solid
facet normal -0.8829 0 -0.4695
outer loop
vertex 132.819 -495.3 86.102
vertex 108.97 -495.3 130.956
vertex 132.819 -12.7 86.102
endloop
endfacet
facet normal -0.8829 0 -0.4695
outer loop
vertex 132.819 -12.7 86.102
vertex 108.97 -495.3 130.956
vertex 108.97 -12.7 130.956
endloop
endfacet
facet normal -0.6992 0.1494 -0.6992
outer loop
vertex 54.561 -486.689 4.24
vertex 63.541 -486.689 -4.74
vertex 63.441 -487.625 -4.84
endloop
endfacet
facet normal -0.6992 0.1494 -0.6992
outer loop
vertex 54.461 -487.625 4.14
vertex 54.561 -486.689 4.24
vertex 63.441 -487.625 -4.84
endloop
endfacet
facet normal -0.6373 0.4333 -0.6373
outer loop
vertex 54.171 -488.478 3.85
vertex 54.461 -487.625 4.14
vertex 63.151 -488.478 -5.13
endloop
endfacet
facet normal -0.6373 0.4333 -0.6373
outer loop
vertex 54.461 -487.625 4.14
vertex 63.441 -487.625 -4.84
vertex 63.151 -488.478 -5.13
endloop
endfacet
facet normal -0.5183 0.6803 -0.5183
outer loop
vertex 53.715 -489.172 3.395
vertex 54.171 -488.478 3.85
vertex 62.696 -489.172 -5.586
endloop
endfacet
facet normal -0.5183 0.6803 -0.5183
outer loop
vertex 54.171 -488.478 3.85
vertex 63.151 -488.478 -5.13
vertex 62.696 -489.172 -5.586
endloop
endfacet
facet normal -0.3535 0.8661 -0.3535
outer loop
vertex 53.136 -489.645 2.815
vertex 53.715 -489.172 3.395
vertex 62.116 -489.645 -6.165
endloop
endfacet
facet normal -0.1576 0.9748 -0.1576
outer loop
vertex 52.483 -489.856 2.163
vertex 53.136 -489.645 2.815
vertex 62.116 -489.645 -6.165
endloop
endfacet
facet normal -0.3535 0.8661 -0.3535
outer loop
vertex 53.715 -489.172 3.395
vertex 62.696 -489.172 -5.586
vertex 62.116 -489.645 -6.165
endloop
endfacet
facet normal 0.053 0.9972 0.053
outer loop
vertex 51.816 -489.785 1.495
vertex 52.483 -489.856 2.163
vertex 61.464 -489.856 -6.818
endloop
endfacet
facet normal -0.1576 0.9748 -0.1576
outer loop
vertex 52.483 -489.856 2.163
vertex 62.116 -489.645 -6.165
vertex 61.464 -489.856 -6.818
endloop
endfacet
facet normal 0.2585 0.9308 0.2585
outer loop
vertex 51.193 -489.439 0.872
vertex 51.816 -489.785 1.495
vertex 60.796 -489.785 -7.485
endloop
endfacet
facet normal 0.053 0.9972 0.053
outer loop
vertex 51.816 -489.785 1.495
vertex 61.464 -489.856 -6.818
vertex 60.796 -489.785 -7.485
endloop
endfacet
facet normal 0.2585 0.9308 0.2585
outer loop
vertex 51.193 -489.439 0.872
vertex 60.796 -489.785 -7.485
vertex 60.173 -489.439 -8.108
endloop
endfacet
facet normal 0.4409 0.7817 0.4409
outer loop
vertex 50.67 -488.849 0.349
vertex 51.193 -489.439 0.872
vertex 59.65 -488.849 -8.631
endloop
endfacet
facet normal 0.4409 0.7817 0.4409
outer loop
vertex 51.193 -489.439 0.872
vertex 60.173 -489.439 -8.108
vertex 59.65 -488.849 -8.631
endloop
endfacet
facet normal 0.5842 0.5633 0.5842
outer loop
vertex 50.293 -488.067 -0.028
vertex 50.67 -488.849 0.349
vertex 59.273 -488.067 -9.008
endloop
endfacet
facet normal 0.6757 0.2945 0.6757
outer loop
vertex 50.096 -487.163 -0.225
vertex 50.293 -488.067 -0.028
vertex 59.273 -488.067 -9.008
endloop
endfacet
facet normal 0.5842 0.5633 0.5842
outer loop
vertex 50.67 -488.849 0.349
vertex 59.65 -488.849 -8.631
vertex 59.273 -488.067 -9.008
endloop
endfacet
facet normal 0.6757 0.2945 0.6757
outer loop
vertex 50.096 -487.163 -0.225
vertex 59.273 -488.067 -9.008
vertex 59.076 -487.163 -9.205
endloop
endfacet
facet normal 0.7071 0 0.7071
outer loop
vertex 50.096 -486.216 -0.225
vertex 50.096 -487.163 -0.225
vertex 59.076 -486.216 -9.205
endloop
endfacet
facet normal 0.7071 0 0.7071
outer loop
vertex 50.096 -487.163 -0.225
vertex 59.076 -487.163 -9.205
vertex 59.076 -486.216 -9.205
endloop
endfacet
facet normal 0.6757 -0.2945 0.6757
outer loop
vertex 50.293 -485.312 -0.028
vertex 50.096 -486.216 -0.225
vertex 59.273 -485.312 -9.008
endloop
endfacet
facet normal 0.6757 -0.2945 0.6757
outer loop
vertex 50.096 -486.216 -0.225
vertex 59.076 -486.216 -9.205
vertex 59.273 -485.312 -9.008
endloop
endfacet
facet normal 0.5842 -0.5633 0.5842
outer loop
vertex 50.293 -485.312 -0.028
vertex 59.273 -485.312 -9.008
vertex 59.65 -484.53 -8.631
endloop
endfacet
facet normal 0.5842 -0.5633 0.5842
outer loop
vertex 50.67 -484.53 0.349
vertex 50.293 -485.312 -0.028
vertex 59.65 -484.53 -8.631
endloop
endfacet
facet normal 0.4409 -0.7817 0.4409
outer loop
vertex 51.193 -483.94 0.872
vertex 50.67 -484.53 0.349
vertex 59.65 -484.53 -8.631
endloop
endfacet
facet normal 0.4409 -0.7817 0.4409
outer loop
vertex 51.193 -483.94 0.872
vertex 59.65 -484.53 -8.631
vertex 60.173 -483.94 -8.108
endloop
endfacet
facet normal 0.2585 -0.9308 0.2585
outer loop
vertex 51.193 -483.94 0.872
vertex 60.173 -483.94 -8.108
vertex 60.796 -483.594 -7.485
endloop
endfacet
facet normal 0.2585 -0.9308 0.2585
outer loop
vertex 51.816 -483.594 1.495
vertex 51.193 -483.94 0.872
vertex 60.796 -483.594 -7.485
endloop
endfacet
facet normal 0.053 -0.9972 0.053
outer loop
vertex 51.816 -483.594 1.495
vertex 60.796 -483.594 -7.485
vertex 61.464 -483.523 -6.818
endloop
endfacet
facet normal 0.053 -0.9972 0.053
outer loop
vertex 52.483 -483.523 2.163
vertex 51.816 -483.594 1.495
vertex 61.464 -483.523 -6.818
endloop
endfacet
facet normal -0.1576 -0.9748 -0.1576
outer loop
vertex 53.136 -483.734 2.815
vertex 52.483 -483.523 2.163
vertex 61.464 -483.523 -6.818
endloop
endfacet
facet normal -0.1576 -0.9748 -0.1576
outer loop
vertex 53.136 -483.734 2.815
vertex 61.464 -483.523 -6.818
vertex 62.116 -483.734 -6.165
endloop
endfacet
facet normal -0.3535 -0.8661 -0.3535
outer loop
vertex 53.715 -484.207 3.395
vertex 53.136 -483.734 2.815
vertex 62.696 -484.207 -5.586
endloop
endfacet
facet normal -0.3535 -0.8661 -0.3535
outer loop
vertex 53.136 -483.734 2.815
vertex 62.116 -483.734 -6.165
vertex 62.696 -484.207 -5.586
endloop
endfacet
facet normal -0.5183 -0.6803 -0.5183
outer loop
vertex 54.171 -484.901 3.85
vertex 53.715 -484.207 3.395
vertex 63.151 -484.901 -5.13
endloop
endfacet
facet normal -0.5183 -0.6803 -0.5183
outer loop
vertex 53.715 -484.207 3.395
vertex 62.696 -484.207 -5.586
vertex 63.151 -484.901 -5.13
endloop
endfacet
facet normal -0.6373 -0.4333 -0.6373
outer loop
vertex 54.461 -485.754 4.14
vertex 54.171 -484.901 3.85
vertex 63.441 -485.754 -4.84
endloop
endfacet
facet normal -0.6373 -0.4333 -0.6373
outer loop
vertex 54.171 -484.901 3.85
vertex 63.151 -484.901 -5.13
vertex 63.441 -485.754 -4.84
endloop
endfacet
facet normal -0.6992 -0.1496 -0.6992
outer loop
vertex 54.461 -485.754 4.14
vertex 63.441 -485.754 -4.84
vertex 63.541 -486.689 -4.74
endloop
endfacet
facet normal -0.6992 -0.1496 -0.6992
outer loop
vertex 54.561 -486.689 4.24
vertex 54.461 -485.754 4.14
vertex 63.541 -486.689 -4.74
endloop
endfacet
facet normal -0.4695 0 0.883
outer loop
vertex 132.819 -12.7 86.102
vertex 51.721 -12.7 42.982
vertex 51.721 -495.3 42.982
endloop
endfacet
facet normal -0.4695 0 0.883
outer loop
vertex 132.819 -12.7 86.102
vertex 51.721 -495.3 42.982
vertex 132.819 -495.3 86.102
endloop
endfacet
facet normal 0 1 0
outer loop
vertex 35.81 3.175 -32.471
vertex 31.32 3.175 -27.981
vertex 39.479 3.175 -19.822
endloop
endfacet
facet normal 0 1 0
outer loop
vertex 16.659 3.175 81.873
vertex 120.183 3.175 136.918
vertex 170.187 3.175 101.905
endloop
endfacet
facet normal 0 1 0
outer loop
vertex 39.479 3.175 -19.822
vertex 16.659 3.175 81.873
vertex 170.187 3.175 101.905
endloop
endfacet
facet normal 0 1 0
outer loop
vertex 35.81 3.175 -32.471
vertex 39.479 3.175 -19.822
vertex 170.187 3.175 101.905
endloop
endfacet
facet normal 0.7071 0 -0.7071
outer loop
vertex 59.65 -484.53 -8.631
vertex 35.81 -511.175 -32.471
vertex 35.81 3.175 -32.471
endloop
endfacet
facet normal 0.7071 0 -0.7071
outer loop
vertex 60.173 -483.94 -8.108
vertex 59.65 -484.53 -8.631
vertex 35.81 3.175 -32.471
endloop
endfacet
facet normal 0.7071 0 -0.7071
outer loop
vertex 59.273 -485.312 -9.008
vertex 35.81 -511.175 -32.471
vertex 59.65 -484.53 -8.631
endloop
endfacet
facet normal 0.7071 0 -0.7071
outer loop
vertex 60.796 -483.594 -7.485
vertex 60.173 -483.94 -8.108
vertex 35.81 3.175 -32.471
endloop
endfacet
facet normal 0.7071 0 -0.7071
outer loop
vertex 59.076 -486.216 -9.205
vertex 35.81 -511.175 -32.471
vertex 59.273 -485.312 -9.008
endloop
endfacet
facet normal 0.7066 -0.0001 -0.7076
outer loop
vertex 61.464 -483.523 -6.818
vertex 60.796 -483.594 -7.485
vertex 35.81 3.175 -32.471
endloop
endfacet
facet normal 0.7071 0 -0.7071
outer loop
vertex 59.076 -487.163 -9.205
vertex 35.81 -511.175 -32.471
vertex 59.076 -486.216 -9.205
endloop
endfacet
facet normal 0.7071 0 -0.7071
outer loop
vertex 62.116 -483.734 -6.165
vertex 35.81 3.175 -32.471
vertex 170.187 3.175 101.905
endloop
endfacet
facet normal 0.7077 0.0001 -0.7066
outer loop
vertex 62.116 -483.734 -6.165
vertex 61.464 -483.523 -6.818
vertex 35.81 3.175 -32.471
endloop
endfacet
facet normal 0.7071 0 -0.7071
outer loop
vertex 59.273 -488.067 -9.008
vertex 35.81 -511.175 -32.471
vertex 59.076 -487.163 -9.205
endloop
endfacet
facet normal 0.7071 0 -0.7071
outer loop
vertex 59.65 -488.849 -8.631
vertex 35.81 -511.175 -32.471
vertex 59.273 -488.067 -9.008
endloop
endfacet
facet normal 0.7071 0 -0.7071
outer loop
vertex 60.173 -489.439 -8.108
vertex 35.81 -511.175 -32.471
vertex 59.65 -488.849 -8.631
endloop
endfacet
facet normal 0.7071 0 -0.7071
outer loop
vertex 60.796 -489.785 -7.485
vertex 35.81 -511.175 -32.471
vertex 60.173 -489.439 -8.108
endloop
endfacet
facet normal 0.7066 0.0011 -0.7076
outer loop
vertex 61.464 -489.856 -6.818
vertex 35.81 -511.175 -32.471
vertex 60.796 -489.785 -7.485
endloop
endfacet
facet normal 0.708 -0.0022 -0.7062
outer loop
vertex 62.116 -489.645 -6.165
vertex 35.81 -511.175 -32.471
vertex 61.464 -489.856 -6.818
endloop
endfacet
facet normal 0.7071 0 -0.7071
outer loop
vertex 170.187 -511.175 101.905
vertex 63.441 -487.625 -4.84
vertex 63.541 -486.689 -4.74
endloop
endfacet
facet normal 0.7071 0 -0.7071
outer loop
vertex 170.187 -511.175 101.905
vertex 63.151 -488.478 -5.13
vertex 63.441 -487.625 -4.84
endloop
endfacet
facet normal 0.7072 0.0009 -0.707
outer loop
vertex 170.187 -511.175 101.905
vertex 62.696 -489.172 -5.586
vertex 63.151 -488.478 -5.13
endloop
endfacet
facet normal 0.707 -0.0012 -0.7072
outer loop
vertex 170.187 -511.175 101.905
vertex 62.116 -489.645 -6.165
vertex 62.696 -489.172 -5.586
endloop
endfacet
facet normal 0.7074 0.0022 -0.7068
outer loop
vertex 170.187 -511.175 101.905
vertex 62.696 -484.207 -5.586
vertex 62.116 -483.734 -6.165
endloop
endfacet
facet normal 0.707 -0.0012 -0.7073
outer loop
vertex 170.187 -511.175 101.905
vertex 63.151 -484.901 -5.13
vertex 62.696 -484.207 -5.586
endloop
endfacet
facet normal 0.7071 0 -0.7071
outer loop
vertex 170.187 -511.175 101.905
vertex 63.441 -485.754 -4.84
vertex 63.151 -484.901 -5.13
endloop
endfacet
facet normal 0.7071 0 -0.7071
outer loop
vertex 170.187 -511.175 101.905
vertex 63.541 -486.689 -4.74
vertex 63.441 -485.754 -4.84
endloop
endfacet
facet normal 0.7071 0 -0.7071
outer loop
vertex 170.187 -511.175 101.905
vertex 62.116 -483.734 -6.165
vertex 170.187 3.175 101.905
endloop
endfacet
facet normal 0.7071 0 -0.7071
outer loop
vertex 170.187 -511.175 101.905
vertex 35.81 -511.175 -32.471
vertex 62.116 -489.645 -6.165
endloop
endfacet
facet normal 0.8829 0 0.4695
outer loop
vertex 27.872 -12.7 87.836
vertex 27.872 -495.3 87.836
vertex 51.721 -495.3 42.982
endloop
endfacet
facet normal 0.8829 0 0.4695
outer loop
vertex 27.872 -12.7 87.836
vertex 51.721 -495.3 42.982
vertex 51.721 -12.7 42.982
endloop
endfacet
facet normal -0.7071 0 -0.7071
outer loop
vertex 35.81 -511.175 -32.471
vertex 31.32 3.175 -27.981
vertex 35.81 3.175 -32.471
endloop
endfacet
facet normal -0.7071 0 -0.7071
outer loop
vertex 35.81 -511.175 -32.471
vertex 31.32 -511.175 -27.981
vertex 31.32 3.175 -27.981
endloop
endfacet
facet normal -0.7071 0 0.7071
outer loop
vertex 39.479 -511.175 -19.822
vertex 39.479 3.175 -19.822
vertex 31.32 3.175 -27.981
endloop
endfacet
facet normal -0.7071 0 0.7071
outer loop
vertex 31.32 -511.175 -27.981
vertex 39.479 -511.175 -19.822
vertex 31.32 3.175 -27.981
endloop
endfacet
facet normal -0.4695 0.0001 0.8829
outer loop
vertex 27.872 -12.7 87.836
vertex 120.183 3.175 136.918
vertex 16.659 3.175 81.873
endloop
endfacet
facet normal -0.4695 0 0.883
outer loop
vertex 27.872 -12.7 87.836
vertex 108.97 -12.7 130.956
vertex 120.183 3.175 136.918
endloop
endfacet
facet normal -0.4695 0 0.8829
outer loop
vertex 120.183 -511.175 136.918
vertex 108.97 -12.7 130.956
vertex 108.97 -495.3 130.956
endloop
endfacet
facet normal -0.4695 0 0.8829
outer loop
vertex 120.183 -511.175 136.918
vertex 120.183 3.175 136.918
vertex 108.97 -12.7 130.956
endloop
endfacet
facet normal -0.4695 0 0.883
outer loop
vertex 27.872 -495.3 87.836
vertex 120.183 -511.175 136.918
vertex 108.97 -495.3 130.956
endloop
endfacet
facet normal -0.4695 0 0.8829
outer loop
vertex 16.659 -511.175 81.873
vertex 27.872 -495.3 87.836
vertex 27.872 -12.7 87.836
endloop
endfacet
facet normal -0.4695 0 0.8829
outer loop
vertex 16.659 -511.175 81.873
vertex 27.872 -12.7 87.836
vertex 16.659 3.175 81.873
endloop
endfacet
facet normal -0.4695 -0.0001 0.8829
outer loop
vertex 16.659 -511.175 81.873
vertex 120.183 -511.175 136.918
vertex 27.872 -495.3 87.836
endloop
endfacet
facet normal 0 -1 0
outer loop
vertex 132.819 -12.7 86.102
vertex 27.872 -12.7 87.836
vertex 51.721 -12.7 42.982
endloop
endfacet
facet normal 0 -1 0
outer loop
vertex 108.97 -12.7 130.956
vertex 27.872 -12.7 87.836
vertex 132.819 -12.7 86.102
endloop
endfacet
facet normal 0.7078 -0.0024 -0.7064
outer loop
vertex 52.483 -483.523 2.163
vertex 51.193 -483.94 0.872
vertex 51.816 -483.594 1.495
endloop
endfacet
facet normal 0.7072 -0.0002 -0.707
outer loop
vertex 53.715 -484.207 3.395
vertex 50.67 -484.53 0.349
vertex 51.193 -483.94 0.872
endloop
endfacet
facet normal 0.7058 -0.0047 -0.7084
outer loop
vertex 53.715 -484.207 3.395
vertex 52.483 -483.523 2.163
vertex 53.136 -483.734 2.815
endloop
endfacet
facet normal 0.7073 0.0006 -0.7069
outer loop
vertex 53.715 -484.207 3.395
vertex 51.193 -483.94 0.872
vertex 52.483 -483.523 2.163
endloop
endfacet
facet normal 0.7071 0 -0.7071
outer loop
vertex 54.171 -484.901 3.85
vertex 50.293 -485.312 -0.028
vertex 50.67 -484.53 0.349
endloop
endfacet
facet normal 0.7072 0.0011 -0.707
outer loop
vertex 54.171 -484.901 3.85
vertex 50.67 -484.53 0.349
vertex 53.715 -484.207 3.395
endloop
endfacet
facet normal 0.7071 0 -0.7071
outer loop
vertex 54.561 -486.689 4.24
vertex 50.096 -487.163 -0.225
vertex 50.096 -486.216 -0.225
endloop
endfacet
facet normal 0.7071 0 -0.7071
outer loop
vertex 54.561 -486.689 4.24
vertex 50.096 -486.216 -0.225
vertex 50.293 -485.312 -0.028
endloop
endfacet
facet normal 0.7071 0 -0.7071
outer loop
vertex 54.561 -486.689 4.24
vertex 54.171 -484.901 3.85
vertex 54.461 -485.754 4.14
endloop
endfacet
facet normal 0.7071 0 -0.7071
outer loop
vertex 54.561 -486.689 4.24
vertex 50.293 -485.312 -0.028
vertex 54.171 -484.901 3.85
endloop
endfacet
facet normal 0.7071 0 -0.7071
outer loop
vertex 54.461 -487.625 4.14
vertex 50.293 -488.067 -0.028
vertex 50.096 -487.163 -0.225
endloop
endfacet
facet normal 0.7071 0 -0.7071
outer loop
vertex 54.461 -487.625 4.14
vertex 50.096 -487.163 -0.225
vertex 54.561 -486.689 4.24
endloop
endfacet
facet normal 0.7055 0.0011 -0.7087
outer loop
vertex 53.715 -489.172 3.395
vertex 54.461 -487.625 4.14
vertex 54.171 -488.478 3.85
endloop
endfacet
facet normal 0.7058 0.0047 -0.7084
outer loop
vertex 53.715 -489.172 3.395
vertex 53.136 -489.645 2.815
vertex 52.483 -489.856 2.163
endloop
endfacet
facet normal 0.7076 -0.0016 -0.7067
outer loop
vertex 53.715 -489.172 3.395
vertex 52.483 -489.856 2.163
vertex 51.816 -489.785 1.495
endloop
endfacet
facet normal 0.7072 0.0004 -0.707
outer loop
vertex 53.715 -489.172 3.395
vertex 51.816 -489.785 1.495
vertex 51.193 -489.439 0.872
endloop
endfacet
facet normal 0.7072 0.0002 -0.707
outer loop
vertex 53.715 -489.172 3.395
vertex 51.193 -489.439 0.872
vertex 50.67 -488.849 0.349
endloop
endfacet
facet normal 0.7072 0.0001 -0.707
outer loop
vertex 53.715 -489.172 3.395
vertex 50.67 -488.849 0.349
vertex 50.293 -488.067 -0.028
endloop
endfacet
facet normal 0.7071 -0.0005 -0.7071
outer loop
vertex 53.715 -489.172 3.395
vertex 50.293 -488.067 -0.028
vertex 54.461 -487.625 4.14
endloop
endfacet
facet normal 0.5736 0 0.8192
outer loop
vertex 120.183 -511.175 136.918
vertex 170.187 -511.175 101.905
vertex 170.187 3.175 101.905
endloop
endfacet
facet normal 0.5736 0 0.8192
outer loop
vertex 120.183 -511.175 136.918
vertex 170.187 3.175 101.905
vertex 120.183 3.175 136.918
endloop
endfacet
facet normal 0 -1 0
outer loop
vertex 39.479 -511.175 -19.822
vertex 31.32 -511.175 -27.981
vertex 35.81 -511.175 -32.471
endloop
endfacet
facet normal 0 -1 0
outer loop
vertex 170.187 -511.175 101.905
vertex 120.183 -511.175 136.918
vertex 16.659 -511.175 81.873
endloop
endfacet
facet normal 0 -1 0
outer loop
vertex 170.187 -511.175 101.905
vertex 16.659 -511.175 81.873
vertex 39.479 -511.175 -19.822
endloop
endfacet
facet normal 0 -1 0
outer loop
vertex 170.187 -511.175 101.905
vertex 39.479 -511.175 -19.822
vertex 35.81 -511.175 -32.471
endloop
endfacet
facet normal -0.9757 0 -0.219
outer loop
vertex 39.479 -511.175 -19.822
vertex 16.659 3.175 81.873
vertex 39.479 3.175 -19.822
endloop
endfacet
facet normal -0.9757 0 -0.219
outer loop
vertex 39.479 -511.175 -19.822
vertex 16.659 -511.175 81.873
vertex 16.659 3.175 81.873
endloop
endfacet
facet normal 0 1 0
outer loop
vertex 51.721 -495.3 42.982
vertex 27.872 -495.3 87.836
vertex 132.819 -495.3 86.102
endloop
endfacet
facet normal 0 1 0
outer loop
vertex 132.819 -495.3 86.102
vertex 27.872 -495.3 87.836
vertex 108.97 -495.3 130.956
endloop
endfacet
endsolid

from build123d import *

# Parameters (mm, degrees)
F1_DEPTH = 508
F3_W     = 91.848578011
F3_H     = 482.6
F4_DEPTH = 50.8
F2_R     = 3.175
F5_DEPTH = 12.7
F6_DEPTH = 3.175
F7_DEPTH = 3.175


with BuildPart() as f1:
    # F0 (on Front) → F1 (new body)
    with BuildSketch(Plane.XZ):
        Polygon((31.3197647862, -27.9812486264), (35.8098928468, -32.4713766869), (170.1866526071, 101.9053830735), (120.1831479018, 136.9182140051), (16.6587981808, 81.8733408519), (39.4792327577, -19.8217806548), align=None)
    extrude(amount=F1_DEPTH)

    # F3 (on face) → F4 (cut)
    with BuildSketch(Plane(origin=(-30.2663796495, 0, 56.9227812171), x_dir=(0.8829475929, 0, 0.4694715628), z_dir=(-0.4694715628, 0, 0.8829475929))):
        with Locations((111.7703400394, -254)):
            Rectangle(F3_W, F3_H)
    extrude(amount=-F4_DEPTH, mode=Mode.SUBTRACT)

    # F2 (on face) → F5 (cut)
    with BuildSketch(Plane(origin=(34.1406347668, 0, -34.1406347668), x_dir=(0.7071067812, 0, 0.7071067812), z_dir=(0.7071067812, 0, -0.7071067812))):
        with Locations((38.4032874157, 486.6894)):
            Circle(F2_R)
    extrude(amount=-F5_DEPTH, mode=Mode.SUBTRACT)

    # F6 (add): a face of the model
    f6_faces = [f1.faces().sort_by_distance(p)[0] for p in [
        (82.8731770795, -508, 66.5046152241),
    ]]
    extrude(f6_faces, amount=F6_DEPTH)

    # F7 (add): a face of the model
    f7_faces = [f1.faces().sort_by_distance(p)[0] for p in [
        (82.8731770795, 0, 66.5046152241),
    ]]
    extrude(f7_faces, amount=F7_DEPTH)


solid = f1.part
